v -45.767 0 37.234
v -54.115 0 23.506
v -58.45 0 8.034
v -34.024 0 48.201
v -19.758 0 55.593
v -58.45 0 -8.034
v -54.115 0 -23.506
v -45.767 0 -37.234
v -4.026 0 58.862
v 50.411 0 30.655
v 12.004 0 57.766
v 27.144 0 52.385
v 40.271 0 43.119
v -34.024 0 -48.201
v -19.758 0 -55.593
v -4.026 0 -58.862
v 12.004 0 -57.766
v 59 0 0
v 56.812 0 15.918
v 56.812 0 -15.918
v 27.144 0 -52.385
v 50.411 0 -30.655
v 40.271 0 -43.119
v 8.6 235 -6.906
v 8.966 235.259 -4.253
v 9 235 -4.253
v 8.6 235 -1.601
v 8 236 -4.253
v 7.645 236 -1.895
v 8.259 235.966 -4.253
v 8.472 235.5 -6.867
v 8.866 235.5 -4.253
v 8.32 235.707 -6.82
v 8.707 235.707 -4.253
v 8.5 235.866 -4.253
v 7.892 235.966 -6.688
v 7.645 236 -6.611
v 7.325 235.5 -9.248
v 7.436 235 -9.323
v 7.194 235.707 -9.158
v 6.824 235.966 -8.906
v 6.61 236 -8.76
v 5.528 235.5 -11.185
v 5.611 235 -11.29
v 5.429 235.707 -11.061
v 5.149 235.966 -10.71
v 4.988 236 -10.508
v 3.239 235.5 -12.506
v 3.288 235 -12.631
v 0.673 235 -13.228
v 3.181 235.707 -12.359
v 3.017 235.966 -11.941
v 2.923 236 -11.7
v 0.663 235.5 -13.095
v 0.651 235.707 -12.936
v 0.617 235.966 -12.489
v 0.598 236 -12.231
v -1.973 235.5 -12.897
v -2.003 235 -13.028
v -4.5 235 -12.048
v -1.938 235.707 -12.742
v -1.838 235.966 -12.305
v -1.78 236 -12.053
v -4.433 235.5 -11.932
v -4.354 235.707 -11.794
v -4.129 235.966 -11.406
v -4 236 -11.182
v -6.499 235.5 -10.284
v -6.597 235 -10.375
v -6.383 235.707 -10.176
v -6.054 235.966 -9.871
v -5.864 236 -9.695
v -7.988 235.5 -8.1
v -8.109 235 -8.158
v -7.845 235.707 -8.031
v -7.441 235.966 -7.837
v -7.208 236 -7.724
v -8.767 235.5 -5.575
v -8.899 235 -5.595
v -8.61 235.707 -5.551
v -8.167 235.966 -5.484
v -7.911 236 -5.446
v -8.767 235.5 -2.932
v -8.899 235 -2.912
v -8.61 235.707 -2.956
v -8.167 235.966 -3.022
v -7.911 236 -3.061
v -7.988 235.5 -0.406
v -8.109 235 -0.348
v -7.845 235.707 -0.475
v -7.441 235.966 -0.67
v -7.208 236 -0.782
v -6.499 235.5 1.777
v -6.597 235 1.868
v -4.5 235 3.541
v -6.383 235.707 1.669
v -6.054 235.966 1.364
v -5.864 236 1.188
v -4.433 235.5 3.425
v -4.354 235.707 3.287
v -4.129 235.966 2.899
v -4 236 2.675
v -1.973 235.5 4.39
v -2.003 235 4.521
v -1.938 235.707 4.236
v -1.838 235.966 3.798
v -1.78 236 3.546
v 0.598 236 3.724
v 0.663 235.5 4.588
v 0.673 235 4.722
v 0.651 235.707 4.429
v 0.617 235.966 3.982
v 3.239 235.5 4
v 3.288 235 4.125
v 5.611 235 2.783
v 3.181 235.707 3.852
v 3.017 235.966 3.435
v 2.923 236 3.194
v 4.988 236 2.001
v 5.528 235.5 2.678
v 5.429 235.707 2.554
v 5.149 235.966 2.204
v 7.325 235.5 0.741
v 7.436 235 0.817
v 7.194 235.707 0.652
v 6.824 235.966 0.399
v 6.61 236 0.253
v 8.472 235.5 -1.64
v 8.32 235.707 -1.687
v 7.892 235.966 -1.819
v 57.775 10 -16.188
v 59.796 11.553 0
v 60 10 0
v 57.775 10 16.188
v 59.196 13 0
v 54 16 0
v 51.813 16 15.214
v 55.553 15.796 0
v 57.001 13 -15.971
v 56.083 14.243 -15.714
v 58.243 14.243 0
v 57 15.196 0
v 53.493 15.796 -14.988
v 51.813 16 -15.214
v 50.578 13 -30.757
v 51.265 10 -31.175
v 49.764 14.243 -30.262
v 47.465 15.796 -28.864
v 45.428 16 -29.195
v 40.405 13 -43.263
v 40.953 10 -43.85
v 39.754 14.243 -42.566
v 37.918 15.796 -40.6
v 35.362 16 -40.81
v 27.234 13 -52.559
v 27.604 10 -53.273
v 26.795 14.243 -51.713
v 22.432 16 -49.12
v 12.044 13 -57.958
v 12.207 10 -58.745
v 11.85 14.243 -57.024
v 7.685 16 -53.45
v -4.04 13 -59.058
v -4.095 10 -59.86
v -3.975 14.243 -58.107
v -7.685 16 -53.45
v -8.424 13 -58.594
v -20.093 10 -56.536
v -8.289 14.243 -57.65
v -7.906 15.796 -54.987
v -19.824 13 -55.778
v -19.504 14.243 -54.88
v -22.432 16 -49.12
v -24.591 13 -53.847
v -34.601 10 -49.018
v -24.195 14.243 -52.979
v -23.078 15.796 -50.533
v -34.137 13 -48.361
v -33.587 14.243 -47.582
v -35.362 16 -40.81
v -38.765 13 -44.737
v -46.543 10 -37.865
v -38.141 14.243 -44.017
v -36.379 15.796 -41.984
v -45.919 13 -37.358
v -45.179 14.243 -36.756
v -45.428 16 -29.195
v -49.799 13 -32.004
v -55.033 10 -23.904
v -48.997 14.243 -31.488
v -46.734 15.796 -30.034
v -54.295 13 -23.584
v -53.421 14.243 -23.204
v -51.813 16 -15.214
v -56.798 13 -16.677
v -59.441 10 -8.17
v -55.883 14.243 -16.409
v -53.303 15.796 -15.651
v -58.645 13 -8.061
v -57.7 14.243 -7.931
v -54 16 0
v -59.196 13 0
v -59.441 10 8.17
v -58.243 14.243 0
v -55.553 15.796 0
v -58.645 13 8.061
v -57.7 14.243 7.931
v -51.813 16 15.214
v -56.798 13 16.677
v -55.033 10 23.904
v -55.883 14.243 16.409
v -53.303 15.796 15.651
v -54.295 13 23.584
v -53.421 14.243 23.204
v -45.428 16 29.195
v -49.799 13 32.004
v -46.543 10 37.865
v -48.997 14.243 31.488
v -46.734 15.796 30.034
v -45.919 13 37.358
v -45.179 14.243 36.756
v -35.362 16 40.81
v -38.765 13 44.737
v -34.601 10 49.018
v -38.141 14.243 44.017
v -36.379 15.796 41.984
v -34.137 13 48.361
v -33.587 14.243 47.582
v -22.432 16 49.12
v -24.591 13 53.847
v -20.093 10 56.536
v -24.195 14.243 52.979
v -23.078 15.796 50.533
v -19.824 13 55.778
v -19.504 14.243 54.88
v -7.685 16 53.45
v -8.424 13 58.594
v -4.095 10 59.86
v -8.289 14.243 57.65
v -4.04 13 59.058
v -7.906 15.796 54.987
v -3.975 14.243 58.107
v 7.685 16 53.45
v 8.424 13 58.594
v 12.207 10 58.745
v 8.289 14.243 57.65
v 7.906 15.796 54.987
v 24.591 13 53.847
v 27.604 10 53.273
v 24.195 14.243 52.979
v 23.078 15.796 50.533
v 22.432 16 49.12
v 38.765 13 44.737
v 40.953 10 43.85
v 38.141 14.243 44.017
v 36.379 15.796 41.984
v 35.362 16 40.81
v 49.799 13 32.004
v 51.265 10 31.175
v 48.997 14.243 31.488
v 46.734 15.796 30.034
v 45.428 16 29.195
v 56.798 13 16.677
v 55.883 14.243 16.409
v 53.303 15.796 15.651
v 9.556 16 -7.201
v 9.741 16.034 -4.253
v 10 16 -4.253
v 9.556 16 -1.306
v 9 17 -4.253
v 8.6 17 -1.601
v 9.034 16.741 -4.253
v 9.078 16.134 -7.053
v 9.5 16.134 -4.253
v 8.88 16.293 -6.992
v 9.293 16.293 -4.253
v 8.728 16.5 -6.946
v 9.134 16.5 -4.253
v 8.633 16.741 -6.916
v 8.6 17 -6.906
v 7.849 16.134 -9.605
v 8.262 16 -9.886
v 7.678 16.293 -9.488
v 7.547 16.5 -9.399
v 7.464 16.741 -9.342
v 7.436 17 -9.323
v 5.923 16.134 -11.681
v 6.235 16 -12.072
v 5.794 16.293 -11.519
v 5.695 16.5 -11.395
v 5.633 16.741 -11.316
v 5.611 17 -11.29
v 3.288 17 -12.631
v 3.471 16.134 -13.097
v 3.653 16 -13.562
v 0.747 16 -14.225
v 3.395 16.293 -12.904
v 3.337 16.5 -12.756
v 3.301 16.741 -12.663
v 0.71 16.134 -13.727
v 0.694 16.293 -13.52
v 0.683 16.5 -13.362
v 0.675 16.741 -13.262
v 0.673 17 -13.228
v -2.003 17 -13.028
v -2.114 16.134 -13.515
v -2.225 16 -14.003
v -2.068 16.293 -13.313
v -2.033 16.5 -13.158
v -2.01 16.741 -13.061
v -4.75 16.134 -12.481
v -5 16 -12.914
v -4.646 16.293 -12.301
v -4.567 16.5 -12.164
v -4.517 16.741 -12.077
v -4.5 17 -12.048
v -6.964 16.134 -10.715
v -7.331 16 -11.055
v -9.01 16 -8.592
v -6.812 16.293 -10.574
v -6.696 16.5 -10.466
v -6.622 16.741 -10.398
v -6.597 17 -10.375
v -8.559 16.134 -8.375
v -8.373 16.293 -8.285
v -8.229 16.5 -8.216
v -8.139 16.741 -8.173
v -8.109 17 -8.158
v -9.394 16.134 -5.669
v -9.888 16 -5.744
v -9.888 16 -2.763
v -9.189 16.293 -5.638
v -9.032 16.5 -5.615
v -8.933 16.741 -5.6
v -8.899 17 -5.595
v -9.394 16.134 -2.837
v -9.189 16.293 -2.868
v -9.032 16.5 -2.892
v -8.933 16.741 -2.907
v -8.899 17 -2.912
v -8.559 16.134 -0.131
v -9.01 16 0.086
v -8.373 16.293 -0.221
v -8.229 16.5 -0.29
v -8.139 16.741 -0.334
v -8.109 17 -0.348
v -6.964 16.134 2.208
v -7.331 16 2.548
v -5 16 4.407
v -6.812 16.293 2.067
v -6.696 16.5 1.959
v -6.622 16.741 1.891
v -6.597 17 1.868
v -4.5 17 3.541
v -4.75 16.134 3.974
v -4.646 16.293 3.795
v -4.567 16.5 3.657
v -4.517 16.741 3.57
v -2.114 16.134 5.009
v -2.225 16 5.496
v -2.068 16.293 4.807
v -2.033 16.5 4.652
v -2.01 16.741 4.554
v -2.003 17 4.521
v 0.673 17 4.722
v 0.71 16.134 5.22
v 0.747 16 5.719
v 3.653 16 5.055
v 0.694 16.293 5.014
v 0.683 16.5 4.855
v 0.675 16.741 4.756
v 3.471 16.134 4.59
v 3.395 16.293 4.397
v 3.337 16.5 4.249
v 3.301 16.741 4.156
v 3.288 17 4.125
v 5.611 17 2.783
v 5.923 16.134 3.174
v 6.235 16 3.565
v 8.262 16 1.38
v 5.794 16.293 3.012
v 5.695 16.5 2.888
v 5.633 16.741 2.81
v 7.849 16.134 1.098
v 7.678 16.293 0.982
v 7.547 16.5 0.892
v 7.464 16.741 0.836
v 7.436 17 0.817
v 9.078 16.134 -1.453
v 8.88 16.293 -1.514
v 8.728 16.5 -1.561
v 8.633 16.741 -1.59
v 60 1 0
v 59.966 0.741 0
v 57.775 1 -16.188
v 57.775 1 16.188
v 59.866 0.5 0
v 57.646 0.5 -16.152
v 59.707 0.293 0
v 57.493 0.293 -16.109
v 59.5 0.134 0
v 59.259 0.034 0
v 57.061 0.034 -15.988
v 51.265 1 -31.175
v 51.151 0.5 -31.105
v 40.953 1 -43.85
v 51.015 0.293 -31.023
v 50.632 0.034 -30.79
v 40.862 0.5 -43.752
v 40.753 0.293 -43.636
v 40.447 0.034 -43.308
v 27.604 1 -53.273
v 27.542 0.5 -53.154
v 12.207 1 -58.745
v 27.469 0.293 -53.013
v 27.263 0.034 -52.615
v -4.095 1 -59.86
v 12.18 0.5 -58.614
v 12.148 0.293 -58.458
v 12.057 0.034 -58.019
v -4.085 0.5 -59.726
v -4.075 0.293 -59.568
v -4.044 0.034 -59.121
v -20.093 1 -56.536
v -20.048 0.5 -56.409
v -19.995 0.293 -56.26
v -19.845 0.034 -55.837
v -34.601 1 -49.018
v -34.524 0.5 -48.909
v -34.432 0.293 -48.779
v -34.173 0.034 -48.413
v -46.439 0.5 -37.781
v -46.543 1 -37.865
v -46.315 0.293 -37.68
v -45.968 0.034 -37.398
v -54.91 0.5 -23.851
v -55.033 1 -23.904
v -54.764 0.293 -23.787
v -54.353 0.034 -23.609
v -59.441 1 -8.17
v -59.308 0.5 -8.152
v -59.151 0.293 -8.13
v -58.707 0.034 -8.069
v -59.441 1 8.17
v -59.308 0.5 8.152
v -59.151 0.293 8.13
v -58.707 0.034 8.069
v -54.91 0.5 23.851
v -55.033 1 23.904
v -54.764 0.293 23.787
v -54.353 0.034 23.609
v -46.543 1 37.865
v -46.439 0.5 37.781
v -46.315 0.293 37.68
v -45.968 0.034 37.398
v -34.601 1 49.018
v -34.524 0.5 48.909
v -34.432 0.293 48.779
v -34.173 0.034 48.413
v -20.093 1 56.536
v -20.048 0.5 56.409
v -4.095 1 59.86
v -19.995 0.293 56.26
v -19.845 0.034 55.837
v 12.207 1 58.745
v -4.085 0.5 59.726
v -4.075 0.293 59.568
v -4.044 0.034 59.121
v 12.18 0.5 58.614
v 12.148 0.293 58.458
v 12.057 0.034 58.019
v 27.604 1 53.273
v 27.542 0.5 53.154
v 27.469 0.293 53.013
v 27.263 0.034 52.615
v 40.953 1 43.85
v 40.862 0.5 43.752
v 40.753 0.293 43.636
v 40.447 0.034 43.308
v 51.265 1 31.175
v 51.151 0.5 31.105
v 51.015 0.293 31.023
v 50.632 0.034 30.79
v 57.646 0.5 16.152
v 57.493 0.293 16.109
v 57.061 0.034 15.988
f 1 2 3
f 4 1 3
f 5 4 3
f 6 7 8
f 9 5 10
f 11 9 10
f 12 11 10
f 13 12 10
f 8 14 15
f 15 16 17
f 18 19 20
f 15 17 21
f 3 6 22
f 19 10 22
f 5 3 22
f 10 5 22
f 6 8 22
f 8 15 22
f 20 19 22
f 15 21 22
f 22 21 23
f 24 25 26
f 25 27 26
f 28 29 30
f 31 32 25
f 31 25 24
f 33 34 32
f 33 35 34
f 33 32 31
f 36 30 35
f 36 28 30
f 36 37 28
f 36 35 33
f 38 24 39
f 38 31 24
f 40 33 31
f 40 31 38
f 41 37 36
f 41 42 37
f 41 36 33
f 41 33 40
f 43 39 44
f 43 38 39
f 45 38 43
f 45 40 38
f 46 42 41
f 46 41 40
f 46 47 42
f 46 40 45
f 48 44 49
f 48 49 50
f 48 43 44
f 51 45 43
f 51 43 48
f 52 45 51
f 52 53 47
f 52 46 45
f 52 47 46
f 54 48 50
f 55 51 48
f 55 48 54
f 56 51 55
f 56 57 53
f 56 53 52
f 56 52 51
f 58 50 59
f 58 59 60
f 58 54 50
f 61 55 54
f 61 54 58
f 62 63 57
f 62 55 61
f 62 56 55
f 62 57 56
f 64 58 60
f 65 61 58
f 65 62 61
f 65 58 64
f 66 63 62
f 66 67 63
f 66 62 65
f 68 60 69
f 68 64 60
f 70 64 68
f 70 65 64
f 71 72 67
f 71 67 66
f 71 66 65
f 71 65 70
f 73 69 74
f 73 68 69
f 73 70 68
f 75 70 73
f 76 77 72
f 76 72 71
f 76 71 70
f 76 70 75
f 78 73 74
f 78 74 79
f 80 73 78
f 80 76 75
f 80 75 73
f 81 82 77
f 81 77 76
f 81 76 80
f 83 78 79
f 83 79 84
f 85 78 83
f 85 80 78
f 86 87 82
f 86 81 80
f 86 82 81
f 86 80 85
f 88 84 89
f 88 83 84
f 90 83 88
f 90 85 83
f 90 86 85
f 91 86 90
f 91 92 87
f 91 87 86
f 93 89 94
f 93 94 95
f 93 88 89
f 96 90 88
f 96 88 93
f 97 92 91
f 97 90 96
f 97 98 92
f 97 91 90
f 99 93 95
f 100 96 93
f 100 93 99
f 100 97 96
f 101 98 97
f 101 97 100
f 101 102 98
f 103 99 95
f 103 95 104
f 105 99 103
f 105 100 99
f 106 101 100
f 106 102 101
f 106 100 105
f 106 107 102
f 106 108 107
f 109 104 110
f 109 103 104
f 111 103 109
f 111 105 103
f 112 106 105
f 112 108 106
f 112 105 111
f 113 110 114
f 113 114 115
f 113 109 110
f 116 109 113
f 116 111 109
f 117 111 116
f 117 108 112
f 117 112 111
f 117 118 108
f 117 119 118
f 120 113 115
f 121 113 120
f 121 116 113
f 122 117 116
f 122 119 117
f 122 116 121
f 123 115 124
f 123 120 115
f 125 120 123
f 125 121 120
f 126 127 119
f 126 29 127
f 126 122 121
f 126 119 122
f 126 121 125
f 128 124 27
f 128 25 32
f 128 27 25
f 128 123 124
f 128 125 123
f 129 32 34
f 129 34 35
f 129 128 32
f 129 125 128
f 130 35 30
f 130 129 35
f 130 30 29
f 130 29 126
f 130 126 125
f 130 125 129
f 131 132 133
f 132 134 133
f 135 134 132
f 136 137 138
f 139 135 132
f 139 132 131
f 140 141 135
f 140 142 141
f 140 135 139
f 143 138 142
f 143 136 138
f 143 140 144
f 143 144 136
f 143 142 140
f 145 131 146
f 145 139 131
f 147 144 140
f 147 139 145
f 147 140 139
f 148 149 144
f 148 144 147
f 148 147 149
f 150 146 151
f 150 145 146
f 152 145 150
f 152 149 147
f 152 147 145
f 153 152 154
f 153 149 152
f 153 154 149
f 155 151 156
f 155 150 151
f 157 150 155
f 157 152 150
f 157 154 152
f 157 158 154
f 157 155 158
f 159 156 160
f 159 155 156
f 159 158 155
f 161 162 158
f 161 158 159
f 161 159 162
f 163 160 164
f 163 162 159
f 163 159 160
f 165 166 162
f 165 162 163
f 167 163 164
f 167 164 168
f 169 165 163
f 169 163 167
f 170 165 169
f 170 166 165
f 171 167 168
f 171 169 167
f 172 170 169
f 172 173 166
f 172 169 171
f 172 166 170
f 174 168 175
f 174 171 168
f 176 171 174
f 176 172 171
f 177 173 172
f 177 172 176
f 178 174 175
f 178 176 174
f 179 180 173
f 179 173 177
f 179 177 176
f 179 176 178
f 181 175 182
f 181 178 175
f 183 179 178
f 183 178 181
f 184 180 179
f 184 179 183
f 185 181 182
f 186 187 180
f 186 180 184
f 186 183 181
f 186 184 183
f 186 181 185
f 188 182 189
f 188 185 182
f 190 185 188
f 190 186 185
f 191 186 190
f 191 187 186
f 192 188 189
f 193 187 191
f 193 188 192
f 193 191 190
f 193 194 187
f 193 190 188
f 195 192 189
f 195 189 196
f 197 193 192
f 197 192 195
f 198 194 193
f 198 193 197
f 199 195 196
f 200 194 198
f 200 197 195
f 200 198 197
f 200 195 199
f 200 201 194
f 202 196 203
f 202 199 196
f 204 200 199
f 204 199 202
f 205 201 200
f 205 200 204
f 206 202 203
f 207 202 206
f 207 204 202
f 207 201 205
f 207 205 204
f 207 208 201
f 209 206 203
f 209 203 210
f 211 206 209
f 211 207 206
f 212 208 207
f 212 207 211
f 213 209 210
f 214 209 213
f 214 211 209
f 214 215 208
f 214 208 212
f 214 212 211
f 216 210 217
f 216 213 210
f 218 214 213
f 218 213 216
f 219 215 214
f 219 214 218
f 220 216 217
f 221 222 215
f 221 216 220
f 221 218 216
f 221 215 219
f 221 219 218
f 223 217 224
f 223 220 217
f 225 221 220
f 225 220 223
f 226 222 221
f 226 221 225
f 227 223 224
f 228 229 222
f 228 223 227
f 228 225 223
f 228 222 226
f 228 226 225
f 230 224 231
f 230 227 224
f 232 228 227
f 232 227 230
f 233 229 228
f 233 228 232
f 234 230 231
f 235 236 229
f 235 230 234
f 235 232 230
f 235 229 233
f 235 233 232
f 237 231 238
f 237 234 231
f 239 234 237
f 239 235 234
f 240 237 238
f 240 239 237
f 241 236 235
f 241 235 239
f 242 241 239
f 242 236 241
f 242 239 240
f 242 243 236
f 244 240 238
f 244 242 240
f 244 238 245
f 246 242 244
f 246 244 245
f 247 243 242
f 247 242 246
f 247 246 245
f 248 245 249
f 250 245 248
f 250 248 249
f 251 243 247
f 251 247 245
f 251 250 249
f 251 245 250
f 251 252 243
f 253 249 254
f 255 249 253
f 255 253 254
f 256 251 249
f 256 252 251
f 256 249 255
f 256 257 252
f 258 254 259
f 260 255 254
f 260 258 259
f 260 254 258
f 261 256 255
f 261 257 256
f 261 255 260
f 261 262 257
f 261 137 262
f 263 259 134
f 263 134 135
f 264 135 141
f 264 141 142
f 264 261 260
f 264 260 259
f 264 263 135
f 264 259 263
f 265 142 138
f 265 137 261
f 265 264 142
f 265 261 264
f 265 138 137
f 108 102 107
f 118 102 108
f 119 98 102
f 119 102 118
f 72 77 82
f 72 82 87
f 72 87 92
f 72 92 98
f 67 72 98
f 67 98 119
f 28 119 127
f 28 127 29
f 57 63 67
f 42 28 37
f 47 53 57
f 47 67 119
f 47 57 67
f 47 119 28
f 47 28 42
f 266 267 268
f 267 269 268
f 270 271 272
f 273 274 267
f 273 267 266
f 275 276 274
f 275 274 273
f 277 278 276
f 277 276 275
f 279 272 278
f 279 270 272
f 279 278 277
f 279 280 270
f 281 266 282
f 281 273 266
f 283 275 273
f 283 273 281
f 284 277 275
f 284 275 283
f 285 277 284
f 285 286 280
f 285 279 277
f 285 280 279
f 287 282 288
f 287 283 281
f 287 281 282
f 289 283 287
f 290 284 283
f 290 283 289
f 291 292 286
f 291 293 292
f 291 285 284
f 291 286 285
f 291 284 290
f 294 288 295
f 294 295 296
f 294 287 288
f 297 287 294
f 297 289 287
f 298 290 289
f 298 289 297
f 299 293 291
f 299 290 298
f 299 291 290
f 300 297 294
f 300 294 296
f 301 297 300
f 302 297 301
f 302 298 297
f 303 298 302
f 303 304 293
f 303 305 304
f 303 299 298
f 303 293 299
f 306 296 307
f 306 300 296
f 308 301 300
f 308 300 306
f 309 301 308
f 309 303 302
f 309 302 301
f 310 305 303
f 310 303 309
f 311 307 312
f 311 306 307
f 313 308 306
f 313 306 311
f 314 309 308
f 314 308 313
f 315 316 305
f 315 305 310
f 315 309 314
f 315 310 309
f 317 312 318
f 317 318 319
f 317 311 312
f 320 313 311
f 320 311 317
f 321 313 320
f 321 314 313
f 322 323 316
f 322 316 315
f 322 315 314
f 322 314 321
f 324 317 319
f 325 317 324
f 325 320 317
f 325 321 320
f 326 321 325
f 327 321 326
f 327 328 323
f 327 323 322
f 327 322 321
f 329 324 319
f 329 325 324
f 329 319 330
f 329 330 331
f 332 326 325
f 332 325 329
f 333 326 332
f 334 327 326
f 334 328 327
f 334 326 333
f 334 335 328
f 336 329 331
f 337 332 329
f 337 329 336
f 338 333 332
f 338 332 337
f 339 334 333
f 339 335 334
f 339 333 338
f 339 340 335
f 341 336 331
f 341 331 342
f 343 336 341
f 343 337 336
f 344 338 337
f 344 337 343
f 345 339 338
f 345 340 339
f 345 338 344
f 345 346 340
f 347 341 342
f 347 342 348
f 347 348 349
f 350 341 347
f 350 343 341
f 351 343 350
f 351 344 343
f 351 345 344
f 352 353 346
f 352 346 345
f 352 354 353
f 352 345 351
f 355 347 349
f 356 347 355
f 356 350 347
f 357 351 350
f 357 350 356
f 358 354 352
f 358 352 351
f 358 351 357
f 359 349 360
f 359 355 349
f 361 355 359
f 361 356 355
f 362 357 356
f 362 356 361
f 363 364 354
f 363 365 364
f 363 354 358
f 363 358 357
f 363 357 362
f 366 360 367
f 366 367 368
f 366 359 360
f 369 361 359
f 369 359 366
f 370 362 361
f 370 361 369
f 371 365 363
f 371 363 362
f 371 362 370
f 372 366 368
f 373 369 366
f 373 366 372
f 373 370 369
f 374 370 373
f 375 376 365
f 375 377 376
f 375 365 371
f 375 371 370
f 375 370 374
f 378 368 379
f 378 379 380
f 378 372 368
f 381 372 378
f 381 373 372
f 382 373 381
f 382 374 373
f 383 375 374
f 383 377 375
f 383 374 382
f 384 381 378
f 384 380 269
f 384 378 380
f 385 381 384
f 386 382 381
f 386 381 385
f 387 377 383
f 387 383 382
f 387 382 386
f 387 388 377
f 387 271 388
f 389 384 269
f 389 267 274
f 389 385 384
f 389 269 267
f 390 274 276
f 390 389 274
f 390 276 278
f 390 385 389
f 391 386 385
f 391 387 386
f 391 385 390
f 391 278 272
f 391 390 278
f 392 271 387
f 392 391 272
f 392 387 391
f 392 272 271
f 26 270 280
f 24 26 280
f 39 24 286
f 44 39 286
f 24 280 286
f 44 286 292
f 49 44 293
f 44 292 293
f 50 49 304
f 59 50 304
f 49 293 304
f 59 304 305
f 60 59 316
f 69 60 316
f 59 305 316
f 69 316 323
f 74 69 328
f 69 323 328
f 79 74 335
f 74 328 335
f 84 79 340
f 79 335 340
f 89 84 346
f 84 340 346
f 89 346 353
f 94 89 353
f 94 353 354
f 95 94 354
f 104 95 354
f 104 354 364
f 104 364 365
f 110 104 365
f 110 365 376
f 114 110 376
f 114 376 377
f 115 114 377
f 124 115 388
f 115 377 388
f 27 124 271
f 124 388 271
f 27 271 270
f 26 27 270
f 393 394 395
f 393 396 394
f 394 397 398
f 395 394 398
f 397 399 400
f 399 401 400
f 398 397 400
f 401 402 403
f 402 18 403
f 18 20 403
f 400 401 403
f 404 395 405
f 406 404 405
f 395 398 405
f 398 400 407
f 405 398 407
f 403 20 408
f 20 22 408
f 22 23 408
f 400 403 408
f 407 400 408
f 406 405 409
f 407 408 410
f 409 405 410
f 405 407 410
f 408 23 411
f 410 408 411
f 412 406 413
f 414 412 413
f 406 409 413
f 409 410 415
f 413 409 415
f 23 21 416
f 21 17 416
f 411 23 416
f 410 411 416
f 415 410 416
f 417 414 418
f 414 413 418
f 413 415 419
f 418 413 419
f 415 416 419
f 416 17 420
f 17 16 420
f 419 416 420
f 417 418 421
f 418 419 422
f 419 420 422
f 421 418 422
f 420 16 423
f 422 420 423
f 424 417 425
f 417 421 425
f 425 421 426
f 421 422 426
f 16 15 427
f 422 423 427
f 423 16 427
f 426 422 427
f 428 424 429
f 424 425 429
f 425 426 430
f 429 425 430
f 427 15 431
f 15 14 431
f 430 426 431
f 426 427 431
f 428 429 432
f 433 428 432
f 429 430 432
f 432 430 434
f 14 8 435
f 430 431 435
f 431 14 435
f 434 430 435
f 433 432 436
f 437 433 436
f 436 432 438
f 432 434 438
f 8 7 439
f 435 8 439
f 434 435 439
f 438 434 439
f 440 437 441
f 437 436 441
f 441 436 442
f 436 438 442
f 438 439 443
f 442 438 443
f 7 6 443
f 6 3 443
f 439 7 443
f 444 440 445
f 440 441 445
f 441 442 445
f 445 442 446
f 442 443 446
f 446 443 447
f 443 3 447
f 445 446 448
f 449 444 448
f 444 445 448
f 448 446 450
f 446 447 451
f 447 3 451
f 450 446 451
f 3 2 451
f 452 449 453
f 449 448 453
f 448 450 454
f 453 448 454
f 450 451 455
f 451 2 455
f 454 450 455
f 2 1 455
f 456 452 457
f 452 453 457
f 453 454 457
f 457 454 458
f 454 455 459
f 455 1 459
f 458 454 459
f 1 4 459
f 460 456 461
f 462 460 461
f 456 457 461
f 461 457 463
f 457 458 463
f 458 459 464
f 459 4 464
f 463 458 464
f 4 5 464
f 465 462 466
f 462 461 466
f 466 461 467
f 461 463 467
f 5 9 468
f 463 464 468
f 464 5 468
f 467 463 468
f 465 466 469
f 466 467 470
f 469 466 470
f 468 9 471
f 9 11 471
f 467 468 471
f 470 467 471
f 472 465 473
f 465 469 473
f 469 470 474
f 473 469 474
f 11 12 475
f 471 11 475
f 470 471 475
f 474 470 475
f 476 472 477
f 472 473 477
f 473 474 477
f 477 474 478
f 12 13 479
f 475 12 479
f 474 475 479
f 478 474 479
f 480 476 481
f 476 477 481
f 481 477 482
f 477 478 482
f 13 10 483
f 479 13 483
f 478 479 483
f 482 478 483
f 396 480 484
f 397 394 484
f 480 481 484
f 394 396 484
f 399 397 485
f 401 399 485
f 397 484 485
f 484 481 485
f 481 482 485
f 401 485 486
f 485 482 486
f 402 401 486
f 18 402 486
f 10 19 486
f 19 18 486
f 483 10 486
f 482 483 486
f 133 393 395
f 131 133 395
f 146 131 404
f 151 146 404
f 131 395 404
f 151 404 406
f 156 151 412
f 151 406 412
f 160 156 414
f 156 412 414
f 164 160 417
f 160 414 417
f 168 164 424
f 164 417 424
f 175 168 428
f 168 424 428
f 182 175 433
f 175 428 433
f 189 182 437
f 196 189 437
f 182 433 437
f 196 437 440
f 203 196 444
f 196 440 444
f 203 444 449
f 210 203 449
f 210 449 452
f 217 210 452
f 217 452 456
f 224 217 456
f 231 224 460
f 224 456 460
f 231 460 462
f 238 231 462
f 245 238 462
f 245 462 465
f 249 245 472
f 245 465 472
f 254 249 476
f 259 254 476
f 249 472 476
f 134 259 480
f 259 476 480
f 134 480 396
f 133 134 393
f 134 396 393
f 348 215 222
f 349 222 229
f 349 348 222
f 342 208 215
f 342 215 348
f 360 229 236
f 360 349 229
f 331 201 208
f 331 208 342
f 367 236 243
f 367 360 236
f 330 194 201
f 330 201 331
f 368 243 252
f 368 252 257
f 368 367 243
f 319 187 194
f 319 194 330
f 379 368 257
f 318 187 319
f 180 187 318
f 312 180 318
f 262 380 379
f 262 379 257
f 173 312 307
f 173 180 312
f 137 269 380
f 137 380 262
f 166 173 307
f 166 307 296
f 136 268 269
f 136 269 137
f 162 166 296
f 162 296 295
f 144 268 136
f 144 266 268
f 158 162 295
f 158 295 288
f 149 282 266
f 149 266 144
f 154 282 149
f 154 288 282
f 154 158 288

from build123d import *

# Parameters (mm, degrees)
SKETCH1_R           = 60
BOSS_EXTRUDE1_DEPTH = 16
SKETCH2_R           = 9
BOSS_EXTRUDE2_DEPTH = 220
FILLET1_R           = 6
FILLET2_R           = 1


with BuildPart() as part:
    # Sketch1 → Boss-Extrude1 (new body)
    with BuildSketch(Plane(origin=(0, 0, 0), x_dir=(1, 0, 0), z_dir=(0, 1, 0))):
        Circle(SKETCH1_R)
    extrude(amount=BOSS_EXTRUDE1_DEPTH)

    # Sketch2 → Boss-Extrude2 (add)
    with BuildSketch(Plane(origin=(0, 16, 0), x_dir=(1, 0, 0), z_dir=(0, 1, 0))):
        with Locations((0, 4.253298282)):
            Circle(SKETCH2_R)
    extrude(amount=BOSS_EXTRUDE2_DEPTH)

    # Fillet1
    fillet1_edges = [part.edges().sort_by_distance(p)[0] for p in [
        (-60, 16, 0),
    ]]
    fillet(fillet1_edges, radius=FILLET1_R)

    # Fillet2
    fillet2_edges = [part.edges().sort_by_distance(p)[0] for p in [
        (-60, 0, 0),
        (-9, 16, -4.253298282),
        (-9, 236, -4.253298282),
    ]]
    fillet(fillet2_edges, radius=FILLET2_R)


solid = part.part
